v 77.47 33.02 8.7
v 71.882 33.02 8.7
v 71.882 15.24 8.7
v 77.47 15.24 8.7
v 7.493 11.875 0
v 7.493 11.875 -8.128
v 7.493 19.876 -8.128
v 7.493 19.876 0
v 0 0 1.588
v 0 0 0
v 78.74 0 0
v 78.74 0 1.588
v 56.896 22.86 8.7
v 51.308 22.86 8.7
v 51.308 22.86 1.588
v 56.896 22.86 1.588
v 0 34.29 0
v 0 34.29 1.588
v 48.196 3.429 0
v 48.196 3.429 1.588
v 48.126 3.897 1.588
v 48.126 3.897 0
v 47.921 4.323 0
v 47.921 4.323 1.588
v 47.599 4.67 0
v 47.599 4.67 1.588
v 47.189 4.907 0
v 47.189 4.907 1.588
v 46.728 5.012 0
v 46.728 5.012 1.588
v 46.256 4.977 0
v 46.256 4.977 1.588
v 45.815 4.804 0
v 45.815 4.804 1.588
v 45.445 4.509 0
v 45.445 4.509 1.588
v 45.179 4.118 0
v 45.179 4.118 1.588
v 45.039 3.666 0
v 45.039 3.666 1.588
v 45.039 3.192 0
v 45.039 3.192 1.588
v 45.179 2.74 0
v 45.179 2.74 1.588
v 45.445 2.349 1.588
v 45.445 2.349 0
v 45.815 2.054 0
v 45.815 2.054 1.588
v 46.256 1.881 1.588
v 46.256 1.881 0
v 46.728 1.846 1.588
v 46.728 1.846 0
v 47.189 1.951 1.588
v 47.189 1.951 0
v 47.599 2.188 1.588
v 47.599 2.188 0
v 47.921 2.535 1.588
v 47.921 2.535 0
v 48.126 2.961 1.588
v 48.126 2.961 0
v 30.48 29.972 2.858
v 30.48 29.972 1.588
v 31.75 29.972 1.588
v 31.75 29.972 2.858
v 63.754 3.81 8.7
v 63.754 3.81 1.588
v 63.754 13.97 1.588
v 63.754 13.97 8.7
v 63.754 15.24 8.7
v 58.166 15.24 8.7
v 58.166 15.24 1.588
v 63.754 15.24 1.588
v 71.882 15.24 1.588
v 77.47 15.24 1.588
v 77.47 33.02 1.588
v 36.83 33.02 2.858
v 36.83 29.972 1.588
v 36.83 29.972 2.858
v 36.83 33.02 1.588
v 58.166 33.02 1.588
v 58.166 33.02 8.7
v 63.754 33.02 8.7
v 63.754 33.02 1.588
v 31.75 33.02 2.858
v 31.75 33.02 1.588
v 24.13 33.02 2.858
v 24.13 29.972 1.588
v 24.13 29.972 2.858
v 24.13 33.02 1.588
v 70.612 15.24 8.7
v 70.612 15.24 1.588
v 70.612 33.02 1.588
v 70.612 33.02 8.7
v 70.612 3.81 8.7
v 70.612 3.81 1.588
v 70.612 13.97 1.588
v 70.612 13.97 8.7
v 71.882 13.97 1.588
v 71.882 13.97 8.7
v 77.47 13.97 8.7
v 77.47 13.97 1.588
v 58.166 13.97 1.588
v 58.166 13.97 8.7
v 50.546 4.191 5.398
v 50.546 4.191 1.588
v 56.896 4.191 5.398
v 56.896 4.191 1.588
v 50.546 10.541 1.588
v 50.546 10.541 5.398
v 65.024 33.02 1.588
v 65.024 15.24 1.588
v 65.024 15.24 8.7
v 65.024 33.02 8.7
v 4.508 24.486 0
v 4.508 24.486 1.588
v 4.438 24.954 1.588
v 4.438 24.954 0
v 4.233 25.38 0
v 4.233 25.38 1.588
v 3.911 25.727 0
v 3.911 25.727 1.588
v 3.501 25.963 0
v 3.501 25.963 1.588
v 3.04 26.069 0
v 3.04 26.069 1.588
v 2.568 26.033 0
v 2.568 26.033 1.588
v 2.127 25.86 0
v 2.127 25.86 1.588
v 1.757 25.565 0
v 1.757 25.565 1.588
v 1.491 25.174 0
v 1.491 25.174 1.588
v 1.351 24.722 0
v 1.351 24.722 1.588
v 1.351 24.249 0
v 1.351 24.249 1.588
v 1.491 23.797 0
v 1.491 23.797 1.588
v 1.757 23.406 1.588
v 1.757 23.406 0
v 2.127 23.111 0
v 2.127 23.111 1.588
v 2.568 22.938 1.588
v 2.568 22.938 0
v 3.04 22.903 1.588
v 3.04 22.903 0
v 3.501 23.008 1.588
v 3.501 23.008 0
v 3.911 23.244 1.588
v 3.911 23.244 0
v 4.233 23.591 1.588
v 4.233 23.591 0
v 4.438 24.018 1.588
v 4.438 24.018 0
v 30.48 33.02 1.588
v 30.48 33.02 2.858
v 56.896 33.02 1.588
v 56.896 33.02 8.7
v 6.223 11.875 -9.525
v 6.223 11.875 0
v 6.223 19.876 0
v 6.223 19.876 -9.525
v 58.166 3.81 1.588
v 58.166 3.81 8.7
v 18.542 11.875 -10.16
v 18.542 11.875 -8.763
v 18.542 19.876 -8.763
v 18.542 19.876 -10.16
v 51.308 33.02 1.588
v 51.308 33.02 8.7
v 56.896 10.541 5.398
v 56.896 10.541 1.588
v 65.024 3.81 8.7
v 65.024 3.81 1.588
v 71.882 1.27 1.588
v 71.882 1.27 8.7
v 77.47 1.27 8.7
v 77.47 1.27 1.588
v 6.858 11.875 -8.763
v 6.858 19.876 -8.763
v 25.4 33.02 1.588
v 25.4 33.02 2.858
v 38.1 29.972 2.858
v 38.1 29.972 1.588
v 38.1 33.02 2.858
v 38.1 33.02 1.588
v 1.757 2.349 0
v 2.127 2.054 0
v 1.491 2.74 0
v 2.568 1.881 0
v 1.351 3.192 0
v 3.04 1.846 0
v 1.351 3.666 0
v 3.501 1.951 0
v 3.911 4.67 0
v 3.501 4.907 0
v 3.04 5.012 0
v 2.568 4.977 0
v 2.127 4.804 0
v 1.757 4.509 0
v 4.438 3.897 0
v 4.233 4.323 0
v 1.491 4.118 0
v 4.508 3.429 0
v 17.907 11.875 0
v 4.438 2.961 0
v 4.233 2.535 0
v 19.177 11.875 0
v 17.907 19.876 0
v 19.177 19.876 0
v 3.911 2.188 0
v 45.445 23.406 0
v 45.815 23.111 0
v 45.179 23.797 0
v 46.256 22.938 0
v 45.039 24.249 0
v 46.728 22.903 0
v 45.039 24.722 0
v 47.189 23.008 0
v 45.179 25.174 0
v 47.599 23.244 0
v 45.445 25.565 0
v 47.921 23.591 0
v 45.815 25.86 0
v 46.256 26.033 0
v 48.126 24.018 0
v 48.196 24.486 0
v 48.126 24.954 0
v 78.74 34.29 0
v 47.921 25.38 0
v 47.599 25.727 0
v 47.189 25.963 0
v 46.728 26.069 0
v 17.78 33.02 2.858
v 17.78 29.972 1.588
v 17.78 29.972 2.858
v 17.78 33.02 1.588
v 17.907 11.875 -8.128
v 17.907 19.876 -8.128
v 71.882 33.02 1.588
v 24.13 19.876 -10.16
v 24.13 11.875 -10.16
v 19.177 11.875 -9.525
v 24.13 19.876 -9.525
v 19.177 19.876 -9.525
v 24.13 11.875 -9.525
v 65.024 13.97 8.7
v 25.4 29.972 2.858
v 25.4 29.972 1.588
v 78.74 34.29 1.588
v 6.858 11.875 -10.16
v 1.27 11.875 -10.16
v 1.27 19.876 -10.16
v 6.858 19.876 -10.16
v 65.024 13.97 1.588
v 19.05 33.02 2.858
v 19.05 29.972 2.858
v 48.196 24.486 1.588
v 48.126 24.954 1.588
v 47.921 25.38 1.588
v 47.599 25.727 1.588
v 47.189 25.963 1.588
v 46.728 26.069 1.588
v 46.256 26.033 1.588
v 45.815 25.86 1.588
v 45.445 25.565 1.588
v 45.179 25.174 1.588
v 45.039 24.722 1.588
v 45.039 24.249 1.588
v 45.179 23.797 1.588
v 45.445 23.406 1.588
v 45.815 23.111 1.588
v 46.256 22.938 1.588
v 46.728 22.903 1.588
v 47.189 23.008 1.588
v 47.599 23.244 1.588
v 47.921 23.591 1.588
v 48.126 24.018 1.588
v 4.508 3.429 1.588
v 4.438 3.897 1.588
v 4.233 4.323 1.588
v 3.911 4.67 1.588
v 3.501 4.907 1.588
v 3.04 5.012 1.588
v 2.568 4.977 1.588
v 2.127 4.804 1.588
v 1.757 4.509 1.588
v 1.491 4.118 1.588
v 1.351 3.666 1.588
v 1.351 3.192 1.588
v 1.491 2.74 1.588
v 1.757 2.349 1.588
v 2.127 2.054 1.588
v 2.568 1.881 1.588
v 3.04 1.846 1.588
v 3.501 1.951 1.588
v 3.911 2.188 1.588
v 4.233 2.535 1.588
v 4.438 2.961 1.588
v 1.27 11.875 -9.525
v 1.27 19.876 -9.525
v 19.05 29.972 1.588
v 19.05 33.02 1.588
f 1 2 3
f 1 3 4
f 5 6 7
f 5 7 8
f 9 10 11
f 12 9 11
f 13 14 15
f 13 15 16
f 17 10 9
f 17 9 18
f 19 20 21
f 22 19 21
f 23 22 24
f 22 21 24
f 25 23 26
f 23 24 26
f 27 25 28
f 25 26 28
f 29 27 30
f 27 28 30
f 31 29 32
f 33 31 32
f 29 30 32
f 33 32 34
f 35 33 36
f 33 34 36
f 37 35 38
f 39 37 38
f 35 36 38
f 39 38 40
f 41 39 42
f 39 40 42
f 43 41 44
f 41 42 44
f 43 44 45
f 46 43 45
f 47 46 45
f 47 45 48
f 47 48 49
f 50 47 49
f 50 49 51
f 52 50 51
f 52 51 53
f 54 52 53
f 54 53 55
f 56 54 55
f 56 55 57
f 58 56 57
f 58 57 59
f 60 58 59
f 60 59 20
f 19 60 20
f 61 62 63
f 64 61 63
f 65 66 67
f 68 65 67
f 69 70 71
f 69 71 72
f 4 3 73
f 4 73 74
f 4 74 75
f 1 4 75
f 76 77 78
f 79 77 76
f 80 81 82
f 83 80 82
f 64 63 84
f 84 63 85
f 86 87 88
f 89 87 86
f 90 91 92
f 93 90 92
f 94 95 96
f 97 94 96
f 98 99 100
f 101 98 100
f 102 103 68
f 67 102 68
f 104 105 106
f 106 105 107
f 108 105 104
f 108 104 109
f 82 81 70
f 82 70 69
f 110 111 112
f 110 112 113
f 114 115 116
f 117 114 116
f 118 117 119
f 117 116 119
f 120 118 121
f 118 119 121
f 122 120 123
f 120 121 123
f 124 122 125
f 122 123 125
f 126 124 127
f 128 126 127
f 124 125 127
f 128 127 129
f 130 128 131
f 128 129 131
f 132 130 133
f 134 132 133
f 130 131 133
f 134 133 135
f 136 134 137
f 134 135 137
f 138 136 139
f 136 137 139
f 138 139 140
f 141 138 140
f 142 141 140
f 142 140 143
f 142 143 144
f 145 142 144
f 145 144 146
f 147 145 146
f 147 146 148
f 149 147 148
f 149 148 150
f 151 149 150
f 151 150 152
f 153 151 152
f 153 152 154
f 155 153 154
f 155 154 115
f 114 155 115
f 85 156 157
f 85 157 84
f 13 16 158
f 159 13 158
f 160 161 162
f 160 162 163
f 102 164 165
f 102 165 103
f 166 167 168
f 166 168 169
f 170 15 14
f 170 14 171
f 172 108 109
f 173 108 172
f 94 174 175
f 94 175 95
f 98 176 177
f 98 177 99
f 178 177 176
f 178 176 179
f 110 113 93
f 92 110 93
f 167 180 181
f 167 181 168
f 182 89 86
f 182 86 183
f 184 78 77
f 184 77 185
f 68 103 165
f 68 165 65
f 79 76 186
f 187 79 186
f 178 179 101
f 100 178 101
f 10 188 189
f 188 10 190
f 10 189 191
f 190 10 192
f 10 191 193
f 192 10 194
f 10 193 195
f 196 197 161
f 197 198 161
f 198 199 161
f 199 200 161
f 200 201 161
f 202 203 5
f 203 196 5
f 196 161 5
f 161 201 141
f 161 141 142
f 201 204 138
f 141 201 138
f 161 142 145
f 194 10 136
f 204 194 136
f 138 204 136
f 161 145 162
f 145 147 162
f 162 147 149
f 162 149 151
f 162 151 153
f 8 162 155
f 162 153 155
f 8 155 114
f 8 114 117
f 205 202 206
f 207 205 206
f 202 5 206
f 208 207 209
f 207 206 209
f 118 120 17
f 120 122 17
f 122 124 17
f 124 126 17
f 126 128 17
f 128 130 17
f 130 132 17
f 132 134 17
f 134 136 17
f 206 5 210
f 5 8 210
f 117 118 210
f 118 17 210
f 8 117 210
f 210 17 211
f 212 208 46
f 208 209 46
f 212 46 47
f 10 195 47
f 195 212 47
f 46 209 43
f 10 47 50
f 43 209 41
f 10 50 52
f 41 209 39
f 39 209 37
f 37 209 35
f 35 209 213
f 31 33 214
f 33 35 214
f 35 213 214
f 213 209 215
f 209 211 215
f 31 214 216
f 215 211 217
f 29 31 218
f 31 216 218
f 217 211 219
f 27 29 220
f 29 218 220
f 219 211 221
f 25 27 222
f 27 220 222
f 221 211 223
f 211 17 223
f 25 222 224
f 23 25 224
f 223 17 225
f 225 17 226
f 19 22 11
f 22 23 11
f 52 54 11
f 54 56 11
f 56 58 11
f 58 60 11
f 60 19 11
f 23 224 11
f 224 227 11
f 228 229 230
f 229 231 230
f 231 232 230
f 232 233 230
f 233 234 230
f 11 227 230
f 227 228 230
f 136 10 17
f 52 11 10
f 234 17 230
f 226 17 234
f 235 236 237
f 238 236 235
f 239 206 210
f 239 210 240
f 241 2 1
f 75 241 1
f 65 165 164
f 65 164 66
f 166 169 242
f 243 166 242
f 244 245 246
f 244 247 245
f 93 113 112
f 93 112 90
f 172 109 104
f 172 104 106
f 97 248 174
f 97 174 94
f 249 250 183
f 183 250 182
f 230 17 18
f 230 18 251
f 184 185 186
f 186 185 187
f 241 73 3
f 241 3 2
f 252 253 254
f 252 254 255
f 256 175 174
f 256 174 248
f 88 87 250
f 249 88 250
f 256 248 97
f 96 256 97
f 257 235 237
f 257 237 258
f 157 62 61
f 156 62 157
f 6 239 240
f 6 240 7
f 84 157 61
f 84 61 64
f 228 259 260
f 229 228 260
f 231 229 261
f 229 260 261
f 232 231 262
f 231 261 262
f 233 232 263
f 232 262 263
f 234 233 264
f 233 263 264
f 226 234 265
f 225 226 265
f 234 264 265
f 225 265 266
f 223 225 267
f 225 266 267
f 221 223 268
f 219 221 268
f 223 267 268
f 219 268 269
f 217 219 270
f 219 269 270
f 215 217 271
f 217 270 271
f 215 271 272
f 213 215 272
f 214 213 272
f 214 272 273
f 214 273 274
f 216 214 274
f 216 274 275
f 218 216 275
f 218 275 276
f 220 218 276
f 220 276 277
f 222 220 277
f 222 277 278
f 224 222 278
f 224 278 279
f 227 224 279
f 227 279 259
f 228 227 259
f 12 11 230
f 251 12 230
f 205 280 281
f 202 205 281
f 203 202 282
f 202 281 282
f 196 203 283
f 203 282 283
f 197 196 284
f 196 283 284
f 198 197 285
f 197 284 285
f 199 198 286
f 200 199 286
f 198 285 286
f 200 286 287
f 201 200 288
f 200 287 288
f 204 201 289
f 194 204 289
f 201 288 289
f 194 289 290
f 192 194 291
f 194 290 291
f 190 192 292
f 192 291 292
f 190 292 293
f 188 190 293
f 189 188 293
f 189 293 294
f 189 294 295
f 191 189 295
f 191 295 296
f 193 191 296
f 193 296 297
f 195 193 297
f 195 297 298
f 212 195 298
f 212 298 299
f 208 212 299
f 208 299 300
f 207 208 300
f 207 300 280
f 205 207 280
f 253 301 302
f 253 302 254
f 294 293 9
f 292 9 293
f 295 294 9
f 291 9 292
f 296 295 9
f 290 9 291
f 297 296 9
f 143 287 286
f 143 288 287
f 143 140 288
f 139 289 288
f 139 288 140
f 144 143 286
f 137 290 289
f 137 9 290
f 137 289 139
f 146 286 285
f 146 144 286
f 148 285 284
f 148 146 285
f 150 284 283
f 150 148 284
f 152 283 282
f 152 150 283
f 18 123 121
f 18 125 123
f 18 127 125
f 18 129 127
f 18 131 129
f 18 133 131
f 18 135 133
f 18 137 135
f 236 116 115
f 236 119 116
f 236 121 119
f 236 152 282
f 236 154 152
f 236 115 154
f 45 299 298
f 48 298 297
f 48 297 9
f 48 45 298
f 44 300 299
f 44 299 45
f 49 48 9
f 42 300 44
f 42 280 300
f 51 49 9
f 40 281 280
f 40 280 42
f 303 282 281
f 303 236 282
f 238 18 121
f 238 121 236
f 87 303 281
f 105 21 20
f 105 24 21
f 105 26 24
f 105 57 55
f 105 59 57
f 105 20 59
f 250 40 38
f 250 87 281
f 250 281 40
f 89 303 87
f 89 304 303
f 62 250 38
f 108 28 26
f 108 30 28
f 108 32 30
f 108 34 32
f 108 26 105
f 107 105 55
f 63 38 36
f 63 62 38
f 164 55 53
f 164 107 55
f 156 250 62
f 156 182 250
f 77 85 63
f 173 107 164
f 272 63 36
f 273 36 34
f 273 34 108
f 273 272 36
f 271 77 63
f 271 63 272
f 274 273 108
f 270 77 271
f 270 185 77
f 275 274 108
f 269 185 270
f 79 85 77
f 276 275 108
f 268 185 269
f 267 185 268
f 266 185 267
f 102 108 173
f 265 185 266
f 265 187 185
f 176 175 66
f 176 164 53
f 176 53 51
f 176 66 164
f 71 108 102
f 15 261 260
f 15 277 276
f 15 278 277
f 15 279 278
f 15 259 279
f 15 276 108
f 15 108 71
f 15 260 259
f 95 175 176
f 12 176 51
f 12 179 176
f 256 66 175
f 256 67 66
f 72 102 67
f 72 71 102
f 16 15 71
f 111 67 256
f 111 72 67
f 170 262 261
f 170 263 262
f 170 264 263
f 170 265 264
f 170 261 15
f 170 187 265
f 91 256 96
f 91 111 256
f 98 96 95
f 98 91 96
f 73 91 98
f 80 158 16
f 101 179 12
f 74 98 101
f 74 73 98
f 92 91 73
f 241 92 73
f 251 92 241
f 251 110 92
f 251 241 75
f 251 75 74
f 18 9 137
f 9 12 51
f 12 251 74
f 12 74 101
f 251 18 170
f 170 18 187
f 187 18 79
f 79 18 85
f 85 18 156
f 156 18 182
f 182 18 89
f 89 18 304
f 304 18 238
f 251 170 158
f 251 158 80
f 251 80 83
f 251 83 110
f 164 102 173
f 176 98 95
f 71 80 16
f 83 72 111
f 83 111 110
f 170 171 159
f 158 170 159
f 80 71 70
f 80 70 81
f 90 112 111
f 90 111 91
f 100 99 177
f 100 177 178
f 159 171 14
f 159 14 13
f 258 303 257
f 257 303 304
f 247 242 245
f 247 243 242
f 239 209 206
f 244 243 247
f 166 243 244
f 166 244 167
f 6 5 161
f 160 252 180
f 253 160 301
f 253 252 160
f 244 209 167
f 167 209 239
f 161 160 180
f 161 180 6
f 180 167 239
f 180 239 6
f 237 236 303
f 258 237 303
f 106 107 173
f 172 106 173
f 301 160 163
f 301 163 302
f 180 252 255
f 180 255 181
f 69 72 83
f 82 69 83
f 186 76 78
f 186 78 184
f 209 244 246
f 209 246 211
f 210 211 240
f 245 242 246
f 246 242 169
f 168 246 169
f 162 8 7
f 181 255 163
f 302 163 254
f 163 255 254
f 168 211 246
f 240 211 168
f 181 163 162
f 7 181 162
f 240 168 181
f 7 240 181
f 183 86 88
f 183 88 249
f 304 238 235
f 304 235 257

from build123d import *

# Parameters (mm, degrees)
SKETCH1_W           = 78.74
SKETCH1_H           = 34.29
BOSS_EXTRUDE1_DEPTH = 1.5875
CUT_EXTRUDE1_REACH  = 87.897
SKETCH2_R           = 1.5875
SKETCH3_W           = 5.588
SKETCH3_H           = 10.16
SKETCH3_H_2         = 17.78
SKETCH3_H_3         = 12.7
BOSS_EXTRUDE2_DEPTH = 7.112
SKETCH4_W           = 6.35
SKETCH4_H           = 6.35
BOSS_EXTRUDE3_DEPTH = 3.81
BOSS_EXTRUDE4_DEPTH = 4.0005
SKETCH6_W           = 1.27
SKETCH6_H           = 3.048
BOSS_EXTRUDE5_DEPTH = 1.27


with BuildPart() as part:
    # Sketch1 → Boss-Extrude1 (new body)
    with BuildSketch(Plane.XY):
        with Locations((39.37, 17.145)):
            Rectangle(SKETCH1_W, SKETCH1_H)
    extrude(amount=BOSS_EXTRUDE1_DEPTH)

    # Sketch2 → Cut-Extrude1 (cut, up to next)
    with BuildSketch(Plane.XY.offset(1.5875), mode=Mode.PRIVATE) as cut_extrude1_sk1:
        with Locations((2.921, 3.429)):
            Circle(SKETCH2_R)
    cut_extrude1_tool1 = extrude(cut_extrude1_sk1.sketch, amount=-CUT_EXTRUDE1_REACH, mode=Mode.PRIVATE) & part.part
    # Sketch2 → Cut-Extrude1 (cut, up to next)
    with BuildSketch(Plane.XY.offset(1.5875), mode=Mode.PRIVATE) as cut_extrude1_sk2:
        with Locations((2.921, 24.4856)):
            Circle(SKETCH2_R)
    cut_extrude1_tool2 = extrude(cut_extrude1_sk2.sketch, amount=-CUT_EXTRUDE1_REACH, mode=Mode.PRIVATE) & part.part
    # Sketch2 → Cut-Extrude1 (cut, up to next)
    with BuildSketch(Plane.XY.offset(1.5875), mode=Mode.PRIVATE) as cut_extrude1_sk3:
        with Locations((46.609, 24.4856)):
            Circle(SKETCH2_R)
    cut_extrude1_tool3 = extrude(cut_extrude1_sk3.sketch, amount=-CUT_EXTRUDE1_REACH, mode=Mode.PRIVATE) & part.part
    # Sketch2 → Cut-Extrude1 (cut, up to next)
    with BuildSketch(Plane.XY.offset(1.5875), mode=Mode.PRIVATE) as cut_extrude1_sk4:
        with Locations((46.609, 3.429)):
            Circle(SKETCH2_R)
    cut_extrude1_tool4 = extrude(cut_extrude1_sk4.sketch, amount=-CUT_EXTRUDE1_REACH, mode=Mode.PRIVATE) & part.part
    add(cut_extrude1_tool1.solids().sort_by_distance((2.921, 3.429, 1.5875))[0], mode=Mode.SUBTRACT)
    add(cut_extrude1_tool2.solids().sort_by_distance((2.921, 24.4856, 1.5875))[0], mode=Mode.SUBTRACT)
    add(cut_extrude1_tool3.solids().sort_by_distance((46.609, 24.4856, 1.5875))[0], mode=Mode.SUBTRACT)
    add(cut_extrude1_tool4.solids().sort_by_distance((46.609, 3.429, 1.5875))[0], mode=Mode.SUBTRACT)

    # Sketch3 → Boss-Extrude2 (add)
    with BuildSketch(Plane.XY.offset(1.5875)):
        with Locations((54.102, 27.94)):
            Rectangle(SKETCH3_W, SKETCH3_H)
        with Locations((60.96, 24.13)):
            Rectangle(SKETCH3_W, SKETCH3_H_2)
        with Locations((67.818, 24.13)):
            Rectangle(SKETCH3_W, SKETCH3_H_2)
        with Locations((74.676, 24.13)):
            Rectangle(SKETCH3_W, SKETCH3_H_2)
        with Locations((60.96, 8.89)):
            Rectangle(SKETCH3_W, SKETCH3_H)
        with Locations((67.818, 8.89)):
            Rectangle(SKETCH3_W, SKETCH3_H)
        with Locations((74.676, 7.62)):
            Rectangle(SKETCH3_W, SKETCH3_H_3)
    extrude(amount=BOSS_EXTRUDE2_DEPTH)

    # Sketch4 → Boss-Extrude3 (add)
    with BuildSketch(Plane.XY.offset(1.5875)):
        with Locations((53.721, 7.366)):
            Rectangle(SKETCH4_W, SKETCH4_H)
    extrude(amount=BOSS_EXTRUDE3_DEPTH)

    # Sketch5 → Boss-Extrude4 (add, symmetric)
    with BuildSketch(Plane(origin=(0, 15.875, 0), x_dir=(-1, 0, 0), z_dir=(0, -1, 0))):
        Polygon((-24.13, 9.525), (-19.177, 9.525), (-19.177, 0), (-17.907, 0), (-17.907, 8.128), (-7.493, 8.128), (-7.493, 0), (-6.223, 0), (-6.223, 9.525), (-1.27, 9.525), (-1.27, 10.16), (-6.858, 10.16), (-6.858, 8.763), (-18.542, 8.763), (-18.542, 10.16), (-24.13, 10.16), align=None)
    extrude(amount=BOSS_EXTRUDE4_DEPTH, both=True)

    # Sketch6 → Boss-Extrude5 (add)
    with BuildSketch(Plane.XY.offset(1.5875)):
        with Locations((37.465, 31.496)):
            Rectangle(SKETCH6_W, SKETCH6_H)
        with Locations((31.115, 31.496)):
            Rectangle(SKETCH6_W, SKETCH6_H)
        with Locations((24.765, 31.496)):
            Rectangle(SKETCH6_W, SKETCH6_H)
        with Locations((18.415, 31.496)):
            Rectangle(SKETCH6_W, SKETCH6_H)
    extrude(amount=BOSS_EXTRUDE5_DEPTH)


solid = part.part
